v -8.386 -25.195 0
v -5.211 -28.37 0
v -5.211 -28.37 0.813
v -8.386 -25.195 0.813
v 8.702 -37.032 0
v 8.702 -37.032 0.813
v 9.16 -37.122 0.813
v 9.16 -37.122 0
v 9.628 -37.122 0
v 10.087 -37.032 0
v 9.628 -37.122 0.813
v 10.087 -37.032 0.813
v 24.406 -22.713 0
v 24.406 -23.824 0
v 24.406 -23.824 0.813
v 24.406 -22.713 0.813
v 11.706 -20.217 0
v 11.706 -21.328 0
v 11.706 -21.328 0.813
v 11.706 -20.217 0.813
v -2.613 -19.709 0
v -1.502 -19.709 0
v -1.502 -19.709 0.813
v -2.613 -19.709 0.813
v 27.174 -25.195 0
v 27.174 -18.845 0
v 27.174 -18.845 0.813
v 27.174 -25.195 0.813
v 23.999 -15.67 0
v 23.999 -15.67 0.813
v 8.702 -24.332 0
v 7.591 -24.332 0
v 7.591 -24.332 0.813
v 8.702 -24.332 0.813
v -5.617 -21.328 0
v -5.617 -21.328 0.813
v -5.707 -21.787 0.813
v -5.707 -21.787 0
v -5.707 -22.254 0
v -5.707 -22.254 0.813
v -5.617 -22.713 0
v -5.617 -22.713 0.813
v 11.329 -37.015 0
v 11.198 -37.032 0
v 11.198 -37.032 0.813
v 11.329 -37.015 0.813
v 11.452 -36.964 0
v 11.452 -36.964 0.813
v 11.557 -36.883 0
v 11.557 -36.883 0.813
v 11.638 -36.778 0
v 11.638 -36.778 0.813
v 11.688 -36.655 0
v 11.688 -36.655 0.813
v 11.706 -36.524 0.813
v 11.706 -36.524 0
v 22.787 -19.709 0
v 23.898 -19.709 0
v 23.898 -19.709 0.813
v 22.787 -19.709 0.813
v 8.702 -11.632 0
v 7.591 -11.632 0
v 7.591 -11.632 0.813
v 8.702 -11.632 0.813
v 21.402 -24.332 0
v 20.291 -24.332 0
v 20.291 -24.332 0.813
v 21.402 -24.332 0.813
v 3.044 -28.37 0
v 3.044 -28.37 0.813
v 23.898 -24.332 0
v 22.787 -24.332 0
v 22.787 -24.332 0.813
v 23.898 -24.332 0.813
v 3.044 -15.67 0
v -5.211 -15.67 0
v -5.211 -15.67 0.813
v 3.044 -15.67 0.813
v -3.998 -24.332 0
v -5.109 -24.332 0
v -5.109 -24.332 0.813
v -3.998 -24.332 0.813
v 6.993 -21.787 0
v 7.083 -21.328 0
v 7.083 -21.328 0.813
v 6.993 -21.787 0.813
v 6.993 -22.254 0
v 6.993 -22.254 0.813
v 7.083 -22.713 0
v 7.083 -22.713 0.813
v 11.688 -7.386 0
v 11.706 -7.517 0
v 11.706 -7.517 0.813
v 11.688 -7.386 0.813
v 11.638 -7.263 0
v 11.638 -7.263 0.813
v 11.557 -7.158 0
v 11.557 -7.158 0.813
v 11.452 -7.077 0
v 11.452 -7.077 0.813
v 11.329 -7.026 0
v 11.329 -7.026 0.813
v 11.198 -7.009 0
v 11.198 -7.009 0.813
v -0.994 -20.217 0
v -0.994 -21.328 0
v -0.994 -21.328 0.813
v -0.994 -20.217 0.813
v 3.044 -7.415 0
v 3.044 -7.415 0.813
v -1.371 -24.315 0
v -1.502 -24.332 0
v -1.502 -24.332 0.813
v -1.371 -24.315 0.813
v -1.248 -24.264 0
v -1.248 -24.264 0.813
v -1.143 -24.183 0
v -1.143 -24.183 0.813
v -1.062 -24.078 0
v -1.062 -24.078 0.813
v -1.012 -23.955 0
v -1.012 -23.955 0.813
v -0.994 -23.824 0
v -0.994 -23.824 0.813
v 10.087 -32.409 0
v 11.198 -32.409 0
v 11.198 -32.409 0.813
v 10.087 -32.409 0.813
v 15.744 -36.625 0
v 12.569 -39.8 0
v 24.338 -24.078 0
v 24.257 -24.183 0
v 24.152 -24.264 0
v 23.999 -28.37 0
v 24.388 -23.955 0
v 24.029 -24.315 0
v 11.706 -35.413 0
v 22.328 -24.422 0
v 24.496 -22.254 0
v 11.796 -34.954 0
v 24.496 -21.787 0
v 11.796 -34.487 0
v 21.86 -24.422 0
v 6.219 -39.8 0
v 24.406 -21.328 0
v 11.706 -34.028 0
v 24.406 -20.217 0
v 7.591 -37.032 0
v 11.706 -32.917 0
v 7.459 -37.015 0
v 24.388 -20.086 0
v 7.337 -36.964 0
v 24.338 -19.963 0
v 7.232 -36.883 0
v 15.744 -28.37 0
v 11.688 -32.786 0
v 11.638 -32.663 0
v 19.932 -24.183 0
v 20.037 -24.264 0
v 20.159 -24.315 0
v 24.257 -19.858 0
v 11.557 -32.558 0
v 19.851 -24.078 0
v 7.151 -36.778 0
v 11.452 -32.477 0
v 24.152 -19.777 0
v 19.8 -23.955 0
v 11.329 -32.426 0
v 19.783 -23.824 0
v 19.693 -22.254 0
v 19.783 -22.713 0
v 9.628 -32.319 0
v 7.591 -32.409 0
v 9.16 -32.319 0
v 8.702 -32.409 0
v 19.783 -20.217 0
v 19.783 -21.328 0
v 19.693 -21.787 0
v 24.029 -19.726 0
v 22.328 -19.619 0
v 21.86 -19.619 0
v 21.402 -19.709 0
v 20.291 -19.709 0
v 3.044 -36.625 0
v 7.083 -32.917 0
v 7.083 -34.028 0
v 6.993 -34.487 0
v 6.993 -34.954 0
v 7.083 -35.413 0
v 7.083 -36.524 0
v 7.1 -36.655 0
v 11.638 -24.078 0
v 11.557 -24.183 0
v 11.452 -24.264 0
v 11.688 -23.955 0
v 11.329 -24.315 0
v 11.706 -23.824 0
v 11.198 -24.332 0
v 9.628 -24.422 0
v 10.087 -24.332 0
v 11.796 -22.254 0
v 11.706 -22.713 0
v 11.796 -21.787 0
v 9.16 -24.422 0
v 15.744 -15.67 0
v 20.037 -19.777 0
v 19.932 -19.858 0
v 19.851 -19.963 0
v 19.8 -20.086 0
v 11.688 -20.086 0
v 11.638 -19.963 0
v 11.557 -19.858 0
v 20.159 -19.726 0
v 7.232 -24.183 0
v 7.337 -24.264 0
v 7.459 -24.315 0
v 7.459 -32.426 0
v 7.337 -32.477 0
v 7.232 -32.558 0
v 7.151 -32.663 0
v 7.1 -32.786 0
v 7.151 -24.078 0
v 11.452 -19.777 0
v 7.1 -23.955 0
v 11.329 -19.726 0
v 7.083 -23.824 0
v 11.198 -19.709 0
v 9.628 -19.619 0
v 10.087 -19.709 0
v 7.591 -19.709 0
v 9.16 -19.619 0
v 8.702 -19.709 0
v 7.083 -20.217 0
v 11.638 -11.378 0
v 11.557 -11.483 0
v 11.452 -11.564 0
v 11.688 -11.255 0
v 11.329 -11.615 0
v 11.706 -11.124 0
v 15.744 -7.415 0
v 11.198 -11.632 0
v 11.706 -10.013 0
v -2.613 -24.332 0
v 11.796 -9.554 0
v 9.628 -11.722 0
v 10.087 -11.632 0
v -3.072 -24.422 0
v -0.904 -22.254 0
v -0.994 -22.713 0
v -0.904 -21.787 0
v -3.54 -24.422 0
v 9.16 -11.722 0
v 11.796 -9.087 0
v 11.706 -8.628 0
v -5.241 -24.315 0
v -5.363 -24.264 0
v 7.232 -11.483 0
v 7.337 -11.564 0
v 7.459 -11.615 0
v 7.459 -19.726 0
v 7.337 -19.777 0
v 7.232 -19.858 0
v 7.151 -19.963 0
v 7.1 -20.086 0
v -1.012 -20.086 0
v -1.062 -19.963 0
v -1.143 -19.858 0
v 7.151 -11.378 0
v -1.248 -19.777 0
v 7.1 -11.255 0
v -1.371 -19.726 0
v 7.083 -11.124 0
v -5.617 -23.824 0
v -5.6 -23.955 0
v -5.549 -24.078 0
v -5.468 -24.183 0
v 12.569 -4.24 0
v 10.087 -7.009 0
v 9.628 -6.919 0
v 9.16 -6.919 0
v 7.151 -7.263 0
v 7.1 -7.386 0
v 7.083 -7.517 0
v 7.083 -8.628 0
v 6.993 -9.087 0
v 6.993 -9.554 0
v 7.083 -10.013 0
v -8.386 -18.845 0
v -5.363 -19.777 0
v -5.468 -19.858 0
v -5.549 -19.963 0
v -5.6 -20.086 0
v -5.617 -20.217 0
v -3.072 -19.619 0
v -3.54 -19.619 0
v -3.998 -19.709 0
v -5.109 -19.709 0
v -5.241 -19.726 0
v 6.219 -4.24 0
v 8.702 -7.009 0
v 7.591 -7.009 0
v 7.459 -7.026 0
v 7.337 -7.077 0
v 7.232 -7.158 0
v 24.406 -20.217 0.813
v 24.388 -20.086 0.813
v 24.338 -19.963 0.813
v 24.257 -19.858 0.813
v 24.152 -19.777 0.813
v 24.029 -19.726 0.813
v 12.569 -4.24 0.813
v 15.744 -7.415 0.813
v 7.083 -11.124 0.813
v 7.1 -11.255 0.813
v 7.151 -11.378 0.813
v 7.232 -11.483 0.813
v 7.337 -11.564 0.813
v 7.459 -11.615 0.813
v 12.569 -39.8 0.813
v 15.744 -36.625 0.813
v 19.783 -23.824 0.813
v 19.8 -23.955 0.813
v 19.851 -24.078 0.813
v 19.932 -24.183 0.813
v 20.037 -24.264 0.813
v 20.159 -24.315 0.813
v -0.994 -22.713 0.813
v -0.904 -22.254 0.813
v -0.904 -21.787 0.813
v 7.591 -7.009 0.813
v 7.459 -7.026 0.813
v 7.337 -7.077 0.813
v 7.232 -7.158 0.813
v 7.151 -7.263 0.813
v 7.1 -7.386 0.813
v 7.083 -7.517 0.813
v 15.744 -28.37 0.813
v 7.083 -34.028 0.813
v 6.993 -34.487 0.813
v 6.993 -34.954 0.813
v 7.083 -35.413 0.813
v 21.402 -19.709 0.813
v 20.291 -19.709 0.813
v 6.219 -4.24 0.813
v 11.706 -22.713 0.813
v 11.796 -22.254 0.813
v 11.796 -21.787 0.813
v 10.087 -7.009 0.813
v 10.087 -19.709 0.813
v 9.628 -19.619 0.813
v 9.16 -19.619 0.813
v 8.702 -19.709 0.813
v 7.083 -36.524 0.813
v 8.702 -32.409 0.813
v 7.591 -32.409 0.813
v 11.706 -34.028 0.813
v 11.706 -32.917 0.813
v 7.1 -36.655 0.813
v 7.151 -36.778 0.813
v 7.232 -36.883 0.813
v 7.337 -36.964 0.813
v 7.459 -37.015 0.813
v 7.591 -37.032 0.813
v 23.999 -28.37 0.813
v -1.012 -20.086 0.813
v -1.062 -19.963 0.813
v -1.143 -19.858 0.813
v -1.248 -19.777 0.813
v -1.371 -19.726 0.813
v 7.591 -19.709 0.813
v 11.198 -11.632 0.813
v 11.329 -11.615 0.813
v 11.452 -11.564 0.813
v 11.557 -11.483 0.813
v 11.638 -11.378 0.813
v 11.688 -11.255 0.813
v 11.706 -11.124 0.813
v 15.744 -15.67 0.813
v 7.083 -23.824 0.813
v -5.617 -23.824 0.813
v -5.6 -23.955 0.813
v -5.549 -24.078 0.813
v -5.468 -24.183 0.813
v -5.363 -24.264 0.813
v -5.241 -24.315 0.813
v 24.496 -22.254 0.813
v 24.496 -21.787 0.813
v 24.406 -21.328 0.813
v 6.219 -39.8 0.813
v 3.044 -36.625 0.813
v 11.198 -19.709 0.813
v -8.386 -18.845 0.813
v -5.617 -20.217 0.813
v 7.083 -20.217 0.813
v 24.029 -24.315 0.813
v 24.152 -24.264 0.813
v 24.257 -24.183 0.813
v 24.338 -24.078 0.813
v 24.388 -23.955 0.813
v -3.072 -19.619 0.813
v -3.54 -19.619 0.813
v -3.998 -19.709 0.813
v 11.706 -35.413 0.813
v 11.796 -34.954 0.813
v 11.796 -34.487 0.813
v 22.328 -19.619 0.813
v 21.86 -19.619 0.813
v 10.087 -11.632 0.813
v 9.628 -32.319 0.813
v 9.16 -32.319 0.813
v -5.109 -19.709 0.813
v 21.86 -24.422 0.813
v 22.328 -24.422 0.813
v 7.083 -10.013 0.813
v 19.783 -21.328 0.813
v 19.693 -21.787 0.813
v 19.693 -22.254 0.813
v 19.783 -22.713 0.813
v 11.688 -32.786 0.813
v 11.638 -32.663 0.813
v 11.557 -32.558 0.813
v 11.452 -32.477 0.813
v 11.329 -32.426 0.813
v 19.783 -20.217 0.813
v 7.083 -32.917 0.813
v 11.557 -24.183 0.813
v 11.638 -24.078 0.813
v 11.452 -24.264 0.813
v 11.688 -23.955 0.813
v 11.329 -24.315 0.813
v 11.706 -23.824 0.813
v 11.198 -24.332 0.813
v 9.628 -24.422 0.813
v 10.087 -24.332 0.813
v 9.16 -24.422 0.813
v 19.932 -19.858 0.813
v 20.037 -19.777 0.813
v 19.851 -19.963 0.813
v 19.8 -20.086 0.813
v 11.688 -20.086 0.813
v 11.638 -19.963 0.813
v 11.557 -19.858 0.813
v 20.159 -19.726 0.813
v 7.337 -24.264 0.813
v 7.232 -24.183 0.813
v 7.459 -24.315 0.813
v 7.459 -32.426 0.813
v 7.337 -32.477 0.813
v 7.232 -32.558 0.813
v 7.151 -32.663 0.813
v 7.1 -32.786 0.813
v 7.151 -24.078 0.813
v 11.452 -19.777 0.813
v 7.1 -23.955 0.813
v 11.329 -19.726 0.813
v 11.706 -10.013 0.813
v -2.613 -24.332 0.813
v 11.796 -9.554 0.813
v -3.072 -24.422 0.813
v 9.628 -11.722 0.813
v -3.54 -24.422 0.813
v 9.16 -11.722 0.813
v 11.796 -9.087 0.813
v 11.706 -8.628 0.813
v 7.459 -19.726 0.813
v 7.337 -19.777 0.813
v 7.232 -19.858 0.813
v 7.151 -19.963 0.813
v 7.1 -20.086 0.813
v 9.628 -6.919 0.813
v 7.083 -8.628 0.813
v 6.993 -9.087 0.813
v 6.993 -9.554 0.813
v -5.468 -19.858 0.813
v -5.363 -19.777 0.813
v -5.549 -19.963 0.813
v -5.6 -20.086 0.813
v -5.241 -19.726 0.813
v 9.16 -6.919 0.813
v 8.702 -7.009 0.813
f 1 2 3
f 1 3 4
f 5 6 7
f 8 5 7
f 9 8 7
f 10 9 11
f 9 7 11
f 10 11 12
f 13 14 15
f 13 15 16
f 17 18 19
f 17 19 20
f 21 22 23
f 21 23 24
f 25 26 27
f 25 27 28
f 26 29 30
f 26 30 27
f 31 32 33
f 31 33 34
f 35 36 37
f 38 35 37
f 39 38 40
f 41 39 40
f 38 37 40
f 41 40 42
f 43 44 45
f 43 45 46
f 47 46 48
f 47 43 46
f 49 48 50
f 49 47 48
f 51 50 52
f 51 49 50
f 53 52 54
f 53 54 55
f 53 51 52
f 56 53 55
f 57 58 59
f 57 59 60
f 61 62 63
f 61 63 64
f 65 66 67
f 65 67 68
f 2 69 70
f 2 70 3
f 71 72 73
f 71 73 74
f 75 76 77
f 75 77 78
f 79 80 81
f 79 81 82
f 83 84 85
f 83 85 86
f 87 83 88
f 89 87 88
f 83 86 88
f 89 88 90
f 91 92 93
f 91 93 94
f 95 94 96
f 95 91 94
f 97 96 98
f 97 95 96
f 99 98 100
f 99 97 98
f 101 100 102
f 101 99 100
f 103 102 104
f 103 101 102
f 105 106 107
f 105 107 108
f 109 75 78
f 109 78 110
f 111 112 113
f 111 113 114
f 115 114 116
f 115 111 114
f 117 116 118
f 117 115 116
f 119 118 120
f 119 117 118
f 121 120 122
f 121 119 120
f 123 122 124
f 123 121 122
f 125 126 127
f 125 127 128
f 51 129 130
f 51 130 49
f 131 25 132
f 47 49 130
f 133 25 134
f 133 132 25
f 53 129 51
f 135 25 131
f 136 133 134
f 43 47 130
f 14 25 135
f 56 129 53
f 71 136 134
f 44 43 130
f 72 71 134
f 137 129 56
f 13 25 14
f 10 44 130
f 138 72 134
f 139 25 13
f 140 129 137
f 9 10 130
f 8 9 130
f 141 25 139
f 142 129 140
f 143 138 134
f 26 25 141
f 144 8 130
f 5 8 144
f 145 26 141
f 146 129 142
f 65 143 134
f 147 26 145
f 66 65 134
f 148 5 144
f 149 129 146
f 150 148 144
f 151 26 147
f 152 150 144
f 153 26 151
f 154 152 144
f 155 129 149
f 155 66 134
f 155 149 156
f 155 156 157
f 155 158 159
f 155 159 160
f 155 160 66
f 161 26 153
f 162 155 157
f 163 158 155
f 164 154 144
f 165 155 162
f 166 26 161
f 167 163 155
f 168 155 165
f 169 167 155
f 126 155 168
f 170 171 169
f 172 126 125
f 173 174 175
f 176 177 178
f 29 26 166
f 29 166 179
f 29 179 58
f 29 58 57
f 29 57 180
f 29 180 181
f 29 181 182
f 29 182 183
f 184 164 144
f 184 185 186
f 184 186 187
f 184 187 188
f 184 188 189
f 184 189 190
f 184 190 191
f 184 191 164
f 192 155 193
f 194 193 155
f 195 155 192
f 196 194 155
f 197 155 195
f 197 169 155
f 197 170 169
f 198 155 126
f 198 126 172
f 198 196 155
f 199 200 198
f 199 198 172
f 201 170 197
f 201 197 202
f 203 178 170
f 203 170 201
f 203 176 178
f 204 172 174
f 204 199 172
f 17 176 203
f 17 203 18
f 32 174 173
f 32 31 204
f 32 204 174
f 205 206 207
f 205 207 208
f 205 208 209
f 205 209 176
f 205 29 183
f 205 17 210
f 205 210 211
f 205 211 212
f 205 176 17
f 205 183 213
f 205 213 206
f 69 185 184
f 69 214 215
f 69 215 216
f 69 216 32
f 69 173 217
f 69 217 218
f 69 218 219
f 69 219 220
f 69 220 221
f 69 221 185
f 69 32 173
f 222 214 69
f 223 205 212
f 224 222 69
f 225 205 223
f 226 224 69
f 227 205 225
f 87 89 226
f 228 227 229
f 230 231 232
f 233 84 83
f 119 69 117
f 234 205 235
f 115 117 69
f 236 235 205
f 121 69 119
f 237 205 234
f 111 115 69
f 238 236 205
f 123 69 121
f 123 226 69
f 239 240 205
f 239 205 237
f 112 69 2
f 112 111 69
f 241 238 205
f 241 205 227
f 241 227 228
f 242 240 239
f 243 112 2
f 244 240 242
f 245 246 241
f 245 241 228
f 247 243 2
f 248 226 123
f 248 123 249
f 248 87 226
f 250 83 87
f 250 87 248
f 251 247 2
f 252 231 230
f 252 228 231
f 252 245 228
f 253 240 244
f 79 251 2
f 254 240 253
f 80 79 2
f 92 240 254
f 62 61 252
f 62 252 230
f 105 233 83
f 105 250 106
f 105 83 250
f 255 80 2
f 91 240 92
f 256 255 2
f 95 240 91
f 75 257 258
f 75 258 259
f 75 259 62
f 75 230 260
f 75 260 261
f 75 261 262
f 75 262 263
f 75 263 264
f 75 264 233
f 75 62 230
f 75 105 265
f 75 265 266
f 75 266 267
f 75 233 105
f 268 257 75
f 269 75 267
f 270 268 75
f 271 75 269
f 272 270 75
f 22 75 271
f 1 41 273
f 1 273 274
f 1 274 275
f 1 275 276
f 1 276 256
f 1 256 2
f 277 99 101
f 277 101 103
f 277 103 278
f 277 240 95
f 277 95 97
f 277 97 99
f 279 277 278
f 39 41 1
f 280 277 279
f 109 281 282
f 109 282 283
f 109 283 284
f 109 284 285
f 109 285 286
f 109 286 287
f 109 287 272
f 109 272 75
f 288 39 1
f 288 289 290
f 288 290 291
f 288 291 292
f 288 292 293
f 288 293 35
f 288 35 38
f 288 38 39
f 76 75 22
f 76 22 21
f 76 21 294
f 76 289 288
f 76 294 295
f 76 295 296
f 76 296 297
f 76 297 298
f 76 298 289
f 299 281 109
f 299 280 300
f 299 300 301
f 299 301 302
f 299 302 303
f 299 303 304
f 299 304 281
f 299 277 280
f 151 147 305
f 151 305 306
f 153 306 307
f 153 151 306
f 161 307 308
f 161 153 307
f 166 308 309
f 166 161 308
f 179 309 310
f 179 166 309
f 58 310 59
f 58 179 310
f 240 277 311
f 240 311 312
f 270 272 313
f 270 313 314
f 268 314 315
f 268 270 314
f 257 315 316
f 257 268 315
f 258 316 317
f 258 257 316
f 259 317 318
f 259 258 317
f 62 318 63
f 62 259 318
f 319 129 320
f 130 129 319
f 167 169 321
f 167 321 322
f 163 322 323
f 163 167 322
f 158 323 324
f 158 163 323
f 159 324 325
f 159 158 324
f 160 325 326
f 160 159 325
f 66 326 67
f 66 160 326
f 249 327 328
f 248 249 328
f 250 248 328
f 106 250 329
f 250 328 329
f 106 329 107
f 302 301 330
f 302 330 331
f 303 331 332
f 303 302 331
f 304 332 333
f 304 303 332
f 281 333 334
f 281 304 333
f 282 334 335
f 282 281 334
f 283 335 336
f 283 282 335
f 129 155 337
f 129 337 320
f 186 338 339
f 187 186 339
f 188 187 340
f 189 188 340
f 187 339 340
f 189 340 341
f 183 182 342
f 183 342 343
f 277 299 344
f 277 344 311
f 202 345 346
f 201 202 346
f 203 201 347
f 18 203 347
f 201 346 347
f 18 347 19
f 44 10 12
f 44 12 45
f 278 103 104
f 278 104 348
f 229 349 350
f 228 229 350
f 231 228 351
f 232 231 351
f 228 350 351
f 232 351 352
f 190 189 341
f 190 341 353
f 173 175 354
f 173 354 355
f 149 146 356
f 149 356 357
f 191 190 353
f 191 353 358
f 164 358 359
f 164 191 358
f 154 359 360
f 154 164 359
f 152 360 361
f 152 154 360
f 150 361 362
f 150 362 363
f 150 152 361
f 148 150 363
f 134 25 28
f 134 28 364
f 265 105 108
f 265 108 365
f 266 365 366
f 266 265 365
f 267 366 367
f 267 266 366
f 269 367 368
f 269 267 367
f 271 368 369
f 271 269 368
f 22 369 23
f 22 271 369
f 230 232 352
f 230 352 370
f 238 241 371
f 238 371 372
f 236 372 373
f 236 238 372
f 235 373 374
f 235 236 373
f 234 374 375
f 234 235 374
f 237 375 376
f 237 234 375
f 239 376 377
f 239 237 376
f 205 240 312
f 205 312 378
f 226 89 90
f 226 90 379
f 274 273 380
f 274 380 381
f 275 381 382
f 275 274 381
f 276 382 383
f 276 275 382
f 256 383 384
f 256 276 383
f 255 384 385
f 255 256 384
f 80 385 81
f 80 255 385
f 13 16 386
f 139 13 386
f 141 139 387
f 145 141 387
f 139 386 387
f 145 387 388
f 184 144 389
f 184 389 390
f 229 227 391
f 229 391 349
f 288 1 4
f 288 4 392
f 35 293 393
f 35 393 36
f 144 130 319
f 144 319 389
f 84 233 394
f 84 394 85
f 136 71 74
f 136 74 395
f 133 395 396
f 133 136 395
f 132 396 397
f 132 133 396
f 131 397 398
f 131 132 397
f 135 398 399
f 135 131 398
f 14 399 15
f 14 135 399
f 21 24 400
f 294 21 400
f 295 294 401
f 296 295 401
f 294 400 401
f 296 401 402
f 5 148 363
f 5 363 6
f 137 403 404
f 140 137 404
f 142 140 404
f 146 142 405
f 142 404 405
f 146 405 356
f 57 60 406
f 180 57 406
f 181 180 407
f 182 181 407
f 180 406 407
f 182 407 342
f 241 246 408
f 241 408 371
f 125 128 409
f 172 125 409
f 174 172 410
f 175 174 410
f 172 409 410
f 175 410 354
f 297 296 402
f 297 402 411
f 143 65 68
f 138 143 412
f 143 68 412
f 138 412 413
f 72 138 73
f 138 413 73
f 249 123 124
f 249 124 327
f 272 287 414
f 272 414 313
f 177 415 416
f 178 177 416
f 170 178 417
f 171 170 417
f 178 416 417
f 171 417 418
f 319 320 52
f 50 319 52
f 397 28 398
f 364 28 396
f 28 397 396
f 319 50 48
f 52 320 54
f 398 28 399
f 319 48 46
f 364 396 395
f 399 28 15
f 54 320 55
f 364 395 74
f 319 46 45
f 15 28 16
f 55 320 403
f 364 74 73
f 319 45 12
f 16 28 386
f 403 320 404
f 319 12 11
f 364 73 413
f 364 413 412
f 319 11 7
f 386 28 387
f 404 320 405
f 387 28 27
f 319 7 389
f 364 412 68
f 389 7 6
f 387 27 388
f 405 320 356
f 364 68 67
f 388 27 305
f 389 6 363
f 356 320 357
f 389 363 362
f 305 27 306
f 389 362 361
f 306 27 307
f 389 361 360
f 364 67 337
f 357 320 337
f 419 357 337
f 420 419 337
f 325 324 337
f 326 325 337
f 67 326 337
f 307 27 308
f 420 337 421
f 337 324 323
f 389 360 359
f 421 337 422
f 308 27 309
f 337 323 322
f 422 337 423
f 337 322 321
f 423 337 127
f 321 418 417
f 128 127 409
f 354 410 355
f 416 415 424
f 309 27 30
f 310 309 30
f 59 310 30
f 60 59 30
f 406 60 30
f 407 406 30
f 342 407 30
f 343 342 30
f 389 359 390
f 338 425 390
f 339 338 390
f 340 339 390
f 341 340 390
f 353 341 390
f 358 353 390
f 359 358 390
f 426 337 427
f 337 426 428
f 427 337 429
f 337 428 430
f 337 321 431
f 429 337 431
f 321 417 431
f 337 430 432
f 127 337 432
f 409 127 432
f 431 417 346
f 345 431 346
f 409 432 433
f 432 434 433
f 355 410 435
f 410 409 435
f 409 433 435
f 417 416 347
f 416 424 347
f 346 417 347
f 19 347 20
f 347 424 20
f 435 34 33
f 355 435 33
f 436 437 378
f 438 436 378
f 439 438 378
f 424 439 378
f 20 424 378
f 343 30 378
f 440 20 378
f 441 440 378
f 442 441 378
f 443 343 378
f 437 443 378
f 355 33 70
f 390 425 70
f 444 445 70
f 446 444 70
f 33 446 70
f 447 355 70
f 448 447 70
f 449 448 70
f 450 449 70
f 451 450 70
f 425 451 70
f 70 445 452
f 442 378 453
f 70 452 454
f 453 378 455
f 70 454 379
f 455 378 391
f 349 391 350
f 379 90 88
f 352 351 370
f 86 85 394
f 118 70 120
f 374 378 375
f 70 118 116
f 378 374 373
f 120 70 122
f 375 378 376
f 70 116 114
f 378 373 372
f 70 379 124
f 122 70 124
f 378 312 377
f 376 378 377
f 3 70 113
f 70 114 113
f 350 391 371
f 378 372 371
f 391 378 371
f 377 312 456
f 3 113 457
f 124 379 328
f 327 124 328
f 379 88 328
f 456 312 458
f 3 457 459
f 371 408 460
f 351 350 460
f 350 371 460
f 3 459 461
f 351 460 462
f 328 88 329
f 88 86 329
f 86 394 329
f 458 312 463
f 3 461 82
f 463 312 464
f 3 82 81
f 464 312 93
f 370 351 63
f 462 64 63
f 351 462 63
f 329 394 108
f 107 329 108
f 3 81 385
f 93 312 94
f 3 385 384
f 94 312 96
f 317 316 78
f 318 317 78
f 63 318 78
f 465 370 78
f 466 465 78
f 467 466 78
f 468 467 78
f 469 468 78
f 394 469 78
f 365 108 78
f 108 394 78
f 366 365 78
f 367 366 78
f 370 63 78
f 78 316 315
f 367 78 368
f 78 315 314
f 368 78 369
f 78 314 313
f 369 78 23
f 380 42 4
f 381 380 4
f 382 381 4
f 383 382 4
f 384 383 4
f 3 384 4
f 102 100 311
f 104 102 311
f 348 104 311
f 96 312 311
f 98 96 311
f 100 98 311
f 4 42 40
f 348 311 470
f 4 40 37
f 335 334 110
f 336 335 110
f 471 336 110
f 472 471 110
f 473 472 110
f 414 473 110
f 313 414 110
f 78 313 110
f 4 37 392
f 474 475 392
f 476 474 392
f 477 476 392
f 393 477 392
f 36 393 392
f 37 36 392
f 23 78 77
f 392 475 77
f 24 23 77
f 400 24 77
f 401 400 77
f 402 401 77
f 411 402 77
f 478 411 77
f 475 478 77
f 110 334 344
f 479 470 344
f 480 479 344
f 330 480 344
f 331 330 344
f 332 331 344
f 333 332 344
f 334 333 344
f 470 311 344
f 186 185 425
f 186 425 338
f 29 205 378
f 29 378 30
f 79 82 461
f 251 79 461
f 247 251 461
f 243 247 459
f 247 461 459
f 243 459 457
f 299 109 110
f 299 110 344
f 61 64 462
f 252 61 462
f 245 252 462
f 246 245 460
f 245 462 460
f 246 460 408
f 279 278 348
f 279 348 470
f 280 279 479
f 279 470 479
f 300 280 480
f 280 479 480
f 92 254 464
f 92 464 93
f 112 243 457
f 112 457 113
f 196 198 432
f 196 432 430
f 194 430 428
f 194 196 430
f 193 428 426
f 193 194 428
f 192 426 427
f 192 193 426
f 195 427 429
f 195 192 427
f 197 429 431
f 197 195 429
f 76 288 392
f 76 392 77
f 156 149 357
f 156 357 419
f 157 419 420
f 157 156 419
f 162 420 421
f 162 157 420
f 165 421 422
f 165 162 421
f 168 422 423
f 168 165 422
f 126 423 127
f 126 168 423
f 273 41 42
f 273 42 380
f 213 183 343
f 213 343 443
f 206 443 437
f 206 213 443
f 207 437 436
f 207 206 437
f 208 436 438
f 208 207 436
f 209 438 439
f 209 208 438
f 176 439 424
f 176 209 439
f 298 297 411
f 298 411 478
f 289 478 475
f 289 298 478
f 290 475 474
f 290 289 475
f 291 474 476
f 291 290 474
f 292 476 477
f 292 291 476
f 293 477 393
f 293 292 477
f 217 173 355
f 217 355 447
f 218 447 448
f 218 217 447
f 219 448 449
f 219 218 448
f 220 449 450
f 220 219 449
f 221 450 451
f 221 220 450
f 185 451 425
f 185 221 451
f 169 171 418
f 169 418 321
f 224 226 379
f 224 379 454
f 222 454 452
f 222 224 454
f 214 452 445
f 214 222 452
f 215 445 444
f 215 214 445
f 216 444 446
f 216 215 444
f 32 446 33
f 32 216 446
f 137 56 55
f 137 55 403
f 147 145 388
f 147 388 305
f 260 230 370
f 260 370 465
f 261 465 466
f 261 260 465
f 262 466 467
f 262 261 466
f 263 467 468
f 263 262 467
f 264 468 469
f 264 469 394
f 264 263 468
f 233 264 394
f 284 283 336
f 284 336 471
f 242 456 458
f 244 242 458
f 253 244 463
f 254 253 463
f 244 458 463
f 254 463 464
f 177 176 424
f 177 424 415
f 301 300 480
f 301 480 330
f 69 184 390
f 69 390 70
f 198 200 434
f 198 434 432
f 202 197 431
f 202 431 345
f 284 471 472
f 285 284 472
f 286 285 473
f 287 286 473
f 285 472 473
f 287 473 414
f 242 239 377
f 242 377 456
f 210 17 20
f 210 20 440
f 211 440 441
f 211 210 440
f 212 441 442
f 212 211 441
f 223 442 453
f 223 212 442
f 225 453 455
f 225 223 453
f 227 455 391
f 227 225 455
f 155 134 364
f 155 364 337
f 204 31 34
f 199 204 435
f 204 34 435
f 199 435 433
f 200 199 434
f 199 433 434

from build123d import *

# Parameters (mm, degrees)
BOSS_EXTRUDE1_DEPTH = 0.8128
SKETCH2_R           = 2.413
CUT_EXTRUDE1_DEPTH  = 2.54


with BuildPart() as part:
    # Sketch1 → Boss-Extrude1 (new body)
    with BuildSketch(Plane(origin=(0, 0, 0), x_dir=(-1, 0, 0), z_dir=(0, 0, -1))):
        Polygon((8.385680008, -18.845494556), (5.210680008, -15.670494556), (-3.044319992, -15.670494556), (-3.044319992, -7.415494556), (-6.219319992, -4.240494556), (-12.569319992, -4.240494556), (-15.744319992, -7.415494556), (-15.744319992, -15.670494556), (-23.999319992, -15.670494556), (-27.174319992, -18.845494556), (-27.174319992, -25.195494556), (-23.999319992, -28.370494556), (-15.744319992, -28.370494556), (-15.744319992, -36.625494556), (-12.569319992, -39.800494556), (-6.219319992, -39.800494556), (-3.044319992, -36.625494556), (-3.044319992, -28.370494556), (5.210680008, -28.370494556), (8.385680008, -25.195494556), align=None)
        with BuildLine():
            Line((5.109080019, -24.331894556), (1.502279997, -24.331894556))
            ThreePointArc((1.502279997, -24.331894556), (1.14306976, -24.183104805), (0.994280008, -23.823894568))
            Line((0.994280008, -23.823894568), (0.994280008, -20.217094545))
            ThreePointArc((0.994280008, -20.217094545), (1.14306976, -19.857884308), (1.502279997, -19.709094556))
            Line((1.502279997, -19.709094556), (5.109080019, -19.709094556))
            ThreePointArc((5.109080019, -19.709094556), (5.468290256, -19.857884308), (5.617080008, -20.217094545))
            Line((5.617080008, -20.217094545), (5.617080008, -23.823894568))
            ThreePointArc((5.617080008, -23.823894568), (5.468290256, -24.183104805), (5.109080019, -24.331894556))
        make_face(mode=Mode.SUBTRACT)
        with BuildLine():
            Line((-7.590919981, -24.331894556), (-11.197720003, -24.331894556))
            ThreePointArc((-11.197720003, -24.331894556), (-11.55693024, -24.183104805), (-11.705719992, -23.823894568))
            Line((-11.705719992, -23.823894568), (-11.705719992, -20.217094545))
            ThreePointArc((-11.705719992, -20.217094545), (-11.55693024, -19.857884308), (-11.197720003, -19.709094556))
            Line((-11.197720003, -19.709094556), (-7.590919981, -19.709094556))
            ThreePointArc((-7.590919981, -19.709094556), (-7.231709744, -19.857884308), (-7.082919992, -20.217094545))
            Line((-7.082919992, -20.217094545), (-7.082919992, -23.823894568))
            ThreePointArc((-7.082919992, -23.823894568), (-7.231709744, -24.183104805), (-7.590919981, -24.331894556))
        make_face(mode=Mode.SUBTRACT)
        with BuildLine():
            Line((-11.197720003, -7.009094556), (-7.590919981, -7.009094556))
            ThreePointArc((-7.590919981, -7.009094556), (-7.231709744, -7.157884308), (-7.082919992, -7.517094545))
            Line((-7.082919992, -7.517094545), (-7.082919992, -11.123894568))
            ThreePointArc((-7.082919992, -11.123894568), (-7.231709744, -11.483104805), (-7.590919981, -11.631894556))
            Line((-7.590919981, -11.631894556), (-11.197720003, -11.631894556))
            ThreePointArc((-11.197720003, -11.631894556), (-11.55693024, -11.483104805), (-11.705719992, -11.123894568))
            Line((-11.705719992, -11.123894568), (-11.705719992, -7.517094545))
            ThreePointArc((-11.705719992, -7.517094545), (-11.55693024, -7.157884308), (-11.197720003, -7.009094556))
        make_face(mode=Mode.SUBTRACT)
        with BuildLine():
            Line((-20.290919981, -24.331894556), (-23.897720003, -24.331894556))
            ThreePointArc((-23.897720003, -24.331894556), (-24.25693024, -24.183104805), (-24.405719992, -23.823894568))
            Line((-24.405719992, -23.823894568), (-24.405719992, -20.217094545))
            ThreePointArc((-24.405719992, -20.217094545), (-24.25693024, -19.857884308), (-23.897720003, -19.709094556))
            Line((-23.897720003, -19.709094556), (-20.290919981, -19.709094556))
            ThreePointArc((-20.290919981, -19.709094556), (-19.931709744, -19.857884308), (-19.782919992, -20.217094545))
            Line((-19.782919992, -20.217094545), (-19.782919992, -23.823894568))
            ThreePointArc((-19.782919992, -23.823894568), (-19.931709744, -24.183104805), (-20.290919981, -24.331894556))
        make_face(mode=Mode.SUBTRACT)
        with BuildLine():
            Line((-11.705719992, -36.523894568), (-11.705719992, -32.917094545))
            ThreePointArc((-11.705719992, -32.917094545), (-11.55693024, -32.557884308), (-11.197720003, -32.409094556))
            Line((-11.197720003, -32.409094556), (-7.590919981, -32.409094556))
            ThreePointArc((-7.590919981, -32.409094556), (-7.231709744, -32.557884308), (-7.082919992, -32.917094545))
            Line((-7.082919992, -32.917094545), (-7.082919992, -36.523894568))
            ThreePointArc((-7.082919992, -36.523894568), (-7.231709744, -36.883104805), (-7.590919981, -37.031894556))
            Line((-7.590919981, -37.031894556), (-11.197720003, -37.031894556))
            ThreePointArc((-11.197720003, -37.031894556), (-11.55693024, -36.883104805), (-11.705719992, -36.523894568))
        make_face(mode=Mode.SUBTRACT)
    extrude(amount=-BOSS_EXTRUDE1_DEPTH)

    # Sketch2 → Cut-Extrude1 (cut)
    with BuildSketch(Plane.XY.offset(0.8128)):
        with Locations((-3.305680008, -22.020494556)):
            Circle(SKETCH2_R)
        with Locations((9.394319992, -22.020494556)):
            Circle(SKETCH2_R)
        with Locations((9.394319992, -9.320494556)):
            Circle(SKETCH2_R)
        with Locations((22.094319992, -22.020494556)):
            Circle(SKETCH2_R)
        with Locations((9.394319992, -34.720494556)):
            Circle(SKETCH2_R)
    extrude(amount=-CUT_EXTRUDE1_DEPTH, mode=Mode.SUBTRACT)


solid = part.part
